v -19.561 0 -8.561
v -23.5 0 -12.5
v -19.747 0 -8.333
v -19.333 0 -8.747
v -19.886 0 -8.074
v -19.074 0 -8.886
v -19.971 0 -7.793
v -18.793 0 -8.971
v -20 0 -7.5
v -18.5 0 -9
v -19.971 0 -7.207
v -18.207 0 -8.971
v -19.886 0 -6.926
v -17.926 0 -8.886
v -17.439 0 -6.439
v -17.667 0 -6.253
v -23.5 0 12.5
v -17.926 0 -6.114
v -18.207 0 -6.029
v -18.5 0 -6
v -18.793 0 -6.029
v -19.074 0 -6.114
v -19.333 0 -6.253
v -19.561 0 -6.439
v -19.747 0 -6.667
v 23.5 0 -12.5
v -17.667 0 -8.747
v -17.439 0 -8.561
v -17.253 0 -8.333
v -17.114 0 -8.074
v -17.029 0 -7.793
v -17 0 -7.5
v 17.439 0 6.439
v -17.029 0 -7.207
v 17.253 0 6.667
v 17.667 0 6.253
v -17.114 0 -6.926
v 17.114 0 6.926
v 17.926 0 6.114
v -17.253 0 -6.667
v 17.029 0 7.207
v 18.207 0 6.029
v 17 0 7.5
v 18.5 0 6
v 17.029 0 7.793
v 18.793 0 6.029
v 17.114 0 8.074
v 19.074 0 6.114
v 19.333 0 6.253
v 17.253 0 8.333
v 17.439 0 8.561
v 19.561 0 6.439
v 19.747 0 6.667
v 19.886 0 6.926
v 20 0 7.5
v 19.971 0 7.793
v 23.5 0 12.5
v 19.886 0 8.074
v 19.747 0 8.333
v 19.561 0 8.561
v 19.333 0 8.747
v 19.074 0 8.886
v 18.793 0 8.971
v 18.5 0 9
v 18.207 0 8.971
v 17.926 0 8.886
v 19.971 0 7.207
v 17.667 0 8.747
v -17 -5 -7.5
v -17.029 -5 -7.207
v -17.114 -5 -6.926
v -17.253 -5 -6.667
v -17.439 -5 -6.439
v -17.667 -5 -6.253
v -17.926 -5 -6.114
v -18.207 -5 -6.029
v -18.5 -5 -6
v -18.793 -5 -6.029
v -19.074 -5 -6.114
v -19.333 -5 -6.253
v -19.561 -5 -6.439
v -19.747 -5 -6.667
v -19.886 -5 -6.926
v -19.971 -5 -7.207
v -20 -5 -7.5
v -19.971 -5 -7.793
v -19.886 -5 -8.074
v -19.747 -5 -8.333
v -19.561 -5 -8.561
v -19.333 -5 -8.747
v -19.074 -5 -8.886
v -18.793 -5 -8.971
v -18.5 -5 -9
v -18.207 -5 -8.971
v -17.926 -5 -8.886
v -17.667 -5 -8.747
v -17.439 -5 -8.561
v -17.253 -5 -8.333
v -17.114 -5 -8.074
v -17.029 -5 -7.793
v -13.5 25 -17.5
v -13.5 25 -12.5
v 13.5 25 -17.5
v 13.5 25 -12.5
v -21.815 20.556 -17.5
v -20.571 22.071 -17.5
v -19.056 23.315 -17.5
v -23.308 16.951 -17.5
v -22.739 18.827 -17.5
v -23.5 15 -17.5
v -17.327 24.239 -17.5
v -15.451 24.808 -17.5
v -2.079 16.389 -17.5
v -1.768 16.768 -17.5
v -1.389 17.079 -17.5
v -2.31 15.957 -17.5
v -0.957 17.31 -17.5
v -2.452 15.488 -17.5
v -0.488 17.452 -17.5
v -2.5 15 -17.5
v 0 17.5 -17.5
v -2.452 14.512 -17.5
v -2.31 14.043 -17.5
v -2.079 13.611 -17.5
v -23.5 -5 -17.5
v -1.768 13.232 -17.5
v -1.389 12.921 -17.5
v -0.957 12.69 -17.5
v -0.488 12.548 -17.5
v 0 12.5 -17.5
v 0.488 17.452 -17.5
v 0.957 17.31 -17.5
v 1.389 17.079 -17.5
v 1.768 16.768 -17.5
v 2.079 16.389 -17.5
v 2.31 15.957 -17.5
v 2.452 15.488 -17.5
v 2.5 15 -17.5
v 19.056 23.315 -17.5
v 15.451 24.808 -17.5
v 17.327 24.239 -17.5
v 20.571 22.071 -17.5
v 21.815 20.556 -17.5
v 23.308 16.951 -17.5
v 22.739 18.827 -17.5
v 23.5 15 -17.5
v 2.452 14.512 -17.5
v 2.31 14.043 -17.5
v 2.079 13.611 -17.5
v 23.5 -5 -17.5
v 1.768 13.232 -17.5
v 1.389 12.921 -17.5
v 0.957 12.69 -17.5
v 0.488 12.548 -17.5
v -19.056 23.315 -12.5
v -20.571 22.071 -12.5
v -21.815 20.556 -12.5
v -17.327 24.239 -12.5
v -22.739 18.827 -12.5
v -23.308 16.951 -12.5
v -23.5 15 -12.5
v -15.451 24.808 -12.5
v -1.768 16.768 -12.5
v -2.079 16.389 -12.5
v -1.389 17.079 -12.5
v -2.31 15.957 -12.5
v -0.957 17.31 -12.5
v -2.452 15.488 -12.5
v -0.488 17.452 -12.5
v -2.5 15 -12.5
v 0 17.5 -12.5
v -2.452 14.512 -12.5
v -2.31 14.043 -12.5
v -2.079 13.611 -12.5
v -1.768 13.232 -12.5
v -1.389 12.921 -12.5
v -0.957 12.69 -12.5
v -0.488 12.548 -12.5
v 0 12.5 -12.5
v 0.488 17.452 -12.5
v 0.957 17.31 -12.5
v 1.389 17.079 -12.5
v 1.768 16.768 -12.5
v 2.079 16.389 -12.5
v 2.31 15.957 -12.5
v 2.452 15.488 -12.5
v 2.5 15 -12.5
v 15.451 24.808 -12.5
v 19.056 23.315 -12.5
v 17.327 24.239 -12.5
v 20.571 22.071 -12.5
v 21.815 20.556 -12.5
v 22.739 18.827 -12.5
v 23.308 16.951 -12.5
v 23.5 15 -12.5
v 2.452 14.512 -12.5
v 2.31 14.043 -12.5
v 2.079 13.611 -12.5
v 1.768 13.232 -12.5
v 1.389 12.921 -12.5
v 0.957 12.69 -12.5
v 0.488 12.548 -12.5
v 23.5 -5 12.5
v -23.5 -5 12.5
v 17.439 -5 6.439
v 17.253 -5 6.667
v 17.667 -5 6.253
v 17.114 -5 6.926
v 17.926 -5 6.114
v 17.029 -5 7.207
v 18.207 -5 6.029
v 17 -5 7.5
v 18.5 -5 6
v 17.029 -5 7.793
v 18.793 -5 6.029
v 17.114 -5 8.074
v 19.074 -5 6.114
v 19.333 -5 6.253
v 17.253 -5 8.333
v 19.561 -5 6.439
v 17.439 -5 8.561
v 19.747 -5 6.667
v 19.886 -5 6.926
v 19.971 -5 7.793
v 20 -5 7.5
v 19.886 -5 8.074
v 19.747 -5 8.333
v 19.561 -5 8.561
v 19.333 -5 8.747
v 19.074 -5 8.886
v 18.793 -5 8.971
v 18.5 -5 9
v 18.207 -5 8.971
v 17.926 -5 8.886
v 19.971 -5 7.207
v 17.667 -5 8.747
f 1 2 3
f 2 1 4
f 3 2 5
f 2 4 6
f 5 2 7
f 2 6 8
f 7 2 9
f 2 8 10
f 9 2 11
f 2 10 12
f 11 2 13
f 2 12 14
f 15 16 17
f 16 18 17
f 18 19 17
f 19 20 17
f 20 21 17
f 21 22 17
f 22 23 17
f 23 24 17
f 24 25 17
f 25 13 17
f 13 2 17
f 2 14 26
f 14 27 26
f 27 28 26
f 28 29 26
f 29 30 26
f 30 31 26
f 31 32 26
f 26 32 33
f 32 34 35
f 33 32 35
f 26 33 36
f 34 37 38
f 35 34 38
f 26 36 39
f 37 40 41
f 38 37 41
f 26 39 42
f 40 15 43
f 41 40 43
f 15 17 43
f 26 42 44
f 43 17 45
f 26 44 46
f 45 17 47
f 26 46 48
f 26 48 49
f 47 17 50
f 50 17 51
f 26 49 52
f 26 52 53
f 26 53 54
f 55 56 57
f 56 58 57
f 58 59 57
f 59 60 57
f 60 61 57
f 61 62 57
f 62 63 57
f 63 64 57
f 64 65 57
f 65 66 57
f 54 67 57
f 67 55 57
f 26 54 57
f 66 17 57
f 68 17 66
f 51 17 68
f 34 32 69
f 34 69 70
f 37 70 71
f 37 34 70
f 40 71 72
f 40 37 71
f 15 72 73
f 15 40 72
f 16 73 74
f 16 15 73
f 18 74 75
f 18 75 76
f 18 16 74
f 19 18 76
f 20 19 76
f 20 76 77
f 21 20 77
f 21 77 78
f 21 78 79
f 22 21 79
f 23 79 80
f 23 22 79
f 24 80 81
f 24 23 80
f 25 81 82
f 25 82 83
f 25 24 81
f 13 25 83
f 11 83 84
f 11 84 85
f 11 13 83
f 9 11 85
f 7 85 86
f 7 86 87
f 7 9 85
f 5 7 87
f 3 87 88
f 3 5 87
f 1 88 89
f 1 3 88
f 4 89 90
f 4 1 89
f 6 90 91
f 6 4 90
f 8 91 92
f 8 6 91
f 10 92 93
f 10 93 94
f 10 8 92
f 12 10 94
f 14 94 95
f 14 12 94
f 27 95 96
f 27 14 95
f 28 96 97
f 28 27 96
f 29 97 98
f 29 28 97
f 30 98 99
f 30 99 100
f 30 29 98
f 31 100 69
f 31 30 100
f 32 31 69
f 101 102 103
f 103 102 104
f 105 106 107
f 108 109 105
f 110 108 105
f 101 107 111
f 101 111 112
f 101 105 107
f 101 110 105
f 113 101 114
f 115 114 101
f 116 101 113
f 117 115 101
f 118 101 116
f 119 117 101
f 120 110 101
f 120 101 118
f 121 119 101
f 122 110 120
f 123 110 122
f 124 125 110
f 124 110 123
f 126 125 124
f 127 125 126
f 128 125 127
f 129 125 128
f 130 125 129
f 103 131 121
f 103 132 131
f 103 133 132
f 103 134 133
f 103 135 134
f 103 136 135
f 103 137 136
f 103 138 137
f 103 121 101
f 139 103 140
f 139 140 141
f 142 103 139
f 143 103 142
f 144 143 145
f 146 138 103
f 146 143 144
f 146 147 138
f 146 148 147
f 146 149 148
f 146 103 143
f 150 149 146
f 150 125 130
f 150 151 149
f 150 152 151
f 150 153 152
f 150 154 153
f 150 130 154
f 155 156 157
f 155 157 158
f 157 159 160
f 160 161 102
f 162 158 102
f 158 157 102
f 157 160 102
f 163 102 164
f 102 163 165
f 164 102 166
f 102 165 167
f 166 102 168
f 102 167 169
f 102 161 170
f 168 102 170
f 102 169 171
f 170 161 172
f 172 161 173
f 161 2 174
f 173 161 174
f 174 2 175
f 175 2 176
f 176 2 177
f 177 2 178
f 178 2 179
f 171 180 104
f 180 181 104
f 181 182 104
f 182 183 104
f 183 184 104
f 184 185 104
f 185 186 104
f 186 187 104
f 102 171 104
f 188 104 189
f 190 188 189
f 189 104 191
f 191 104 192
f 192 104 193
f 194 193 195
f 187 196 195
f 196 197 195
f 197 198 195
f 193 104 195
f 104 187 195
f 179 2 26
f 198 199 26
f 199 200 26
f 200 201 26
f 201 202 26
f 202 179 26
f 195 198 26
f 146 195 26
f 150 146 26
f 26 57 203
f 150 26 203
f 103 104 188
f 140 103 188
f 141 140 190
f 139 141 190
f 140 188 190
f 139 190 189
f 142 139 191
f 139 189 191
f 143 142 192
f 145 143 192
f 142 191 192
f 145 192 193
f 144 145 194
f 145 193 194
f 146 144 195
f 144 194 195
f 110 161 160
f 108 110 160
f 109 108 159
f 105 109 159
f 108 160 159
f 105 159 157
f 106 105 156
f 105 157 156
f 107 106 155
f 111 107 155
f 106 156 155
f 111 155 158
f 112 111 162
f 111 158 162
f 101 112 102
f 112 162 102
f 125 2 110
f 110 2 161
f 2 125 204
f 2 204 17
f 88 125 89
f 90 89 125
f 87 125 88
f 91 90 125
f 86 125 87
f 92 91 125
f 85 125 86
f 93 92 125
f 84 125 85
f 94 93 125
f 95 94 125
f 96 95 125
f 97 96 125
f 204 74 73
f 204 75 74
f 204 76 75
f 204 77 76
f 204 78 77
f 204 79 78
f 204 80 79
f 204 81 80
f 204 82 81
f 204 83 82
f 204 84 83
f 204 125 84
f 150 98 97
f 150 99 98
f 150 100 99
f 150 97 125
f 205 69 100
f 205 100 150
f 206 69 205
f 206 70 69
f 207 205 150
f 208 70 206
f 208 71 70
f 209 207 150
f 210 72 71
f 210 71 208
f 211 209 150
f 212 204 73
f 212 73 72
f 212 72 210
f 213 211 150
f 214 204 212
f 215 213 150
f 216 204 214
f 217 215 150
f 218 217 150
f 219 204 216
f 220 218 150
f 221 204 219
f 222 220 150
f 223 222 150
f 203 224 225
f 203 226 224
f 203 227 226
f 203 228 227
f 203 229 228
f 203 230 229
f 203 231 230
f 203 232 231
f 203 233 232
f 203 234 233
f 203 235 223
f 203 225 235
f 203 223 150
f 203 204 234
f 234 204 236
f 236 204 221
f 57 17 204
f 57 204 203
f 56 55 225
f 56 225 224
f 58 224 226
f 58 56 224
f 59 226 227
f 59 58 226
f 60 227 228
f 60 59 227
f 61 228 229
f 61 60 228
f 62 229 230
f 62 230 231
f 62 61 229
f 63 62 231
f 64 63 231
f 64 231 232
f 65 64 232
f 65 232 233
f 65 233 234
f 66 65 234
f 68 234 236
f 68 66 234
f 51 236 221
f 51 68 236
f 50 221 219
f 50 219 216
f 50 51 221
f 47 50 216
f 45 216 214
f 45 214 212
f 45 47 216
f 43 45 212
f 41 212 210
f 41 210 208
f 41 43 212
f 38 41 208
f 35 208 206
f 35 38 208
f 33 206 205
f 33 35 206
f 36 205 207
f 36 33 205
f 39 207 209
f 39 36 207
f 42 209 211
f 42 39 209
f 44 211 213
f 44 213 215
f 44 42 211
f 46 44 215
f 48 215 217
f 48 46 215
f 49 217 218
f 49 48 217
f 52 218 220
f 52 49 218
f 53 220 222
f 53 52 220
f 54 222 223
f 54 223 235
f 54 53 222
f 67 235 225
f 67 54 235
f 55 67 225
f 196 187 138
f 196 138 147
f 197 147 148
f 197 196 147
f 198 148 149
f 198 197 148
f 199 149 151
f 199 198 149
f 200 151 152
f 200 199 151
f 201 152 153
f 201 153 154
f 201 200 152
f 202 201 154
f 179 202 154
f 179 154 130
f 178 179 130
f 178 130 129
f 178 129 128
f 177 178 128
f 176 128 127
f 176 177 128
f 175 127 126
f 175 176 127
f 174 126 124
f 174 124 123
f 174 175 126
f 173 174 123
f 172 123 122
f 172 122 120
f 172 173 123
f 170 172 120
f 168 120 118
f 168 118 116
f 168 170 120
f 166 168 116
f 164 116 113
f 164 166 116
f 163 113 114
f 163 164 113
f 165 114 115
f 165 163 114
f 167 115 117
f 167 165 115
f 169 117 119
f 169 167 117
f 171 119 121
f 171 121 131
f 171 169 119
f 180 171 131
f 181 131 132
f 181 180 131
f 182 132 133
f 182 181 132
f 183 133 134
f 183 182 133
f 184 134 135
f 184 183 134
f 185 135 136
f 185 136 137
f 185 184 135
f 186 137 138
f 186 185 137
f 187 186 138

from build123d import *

# Parameters (mm, degrees)
F0_W     = 47
F0_H     = 25
F0_R     = 1.5
F1_DEPTH = 5
F2_R     = 2.5
F2_W     = 47
F2_H     = 5
F3_DEPTH = 5


with BuildPart() as f1:
    # F0 (on Front) → F1 (new body)
    with BuildSketch(Plane.XZ):
        Rectangle(F0_W, F0_H)
        with Locations((-18.5, -7.5)):
            Circle(F0_R, mode=Mode.SUBTRACT)
        with Locations((18.5, 7.5)):
            Circle(F0_R, mode=Mode.SUBTRACT)
    extrude(amount=F1_DEPTH)

    # F2 (on face) → F3 (join)
    with BuildSketch(Plane(origin=(0, 0, -12.5), x_dir=(1, 0, 0), z_dir=(0, 0, -1))):
        with BuildLine():
            Line((23.5, 0), (-23.5, 0))
            Line((-23.5, 0), (-23.5, -15))
            ThreePointArc((-23.5, -15), (-20.571068, -22.071068), (-13.5, -25))
            Line((-13.5, -25), (13.5, -25))
            ThreePointArc((13.5, -25), (20.571068, -22.071068), (23.5, -15))
            Line((23.5, -15), (23.5, 0))
        make_face()
        with Locations((0, -15)):
            Circle(F2_R, mode=Mode.SUBTRACT)
        with Locations((0, 2.5)):
            Rectangle(F2_W, F2_H)
    extrude(amount=F3_DEPTH)


solid = f1.part
